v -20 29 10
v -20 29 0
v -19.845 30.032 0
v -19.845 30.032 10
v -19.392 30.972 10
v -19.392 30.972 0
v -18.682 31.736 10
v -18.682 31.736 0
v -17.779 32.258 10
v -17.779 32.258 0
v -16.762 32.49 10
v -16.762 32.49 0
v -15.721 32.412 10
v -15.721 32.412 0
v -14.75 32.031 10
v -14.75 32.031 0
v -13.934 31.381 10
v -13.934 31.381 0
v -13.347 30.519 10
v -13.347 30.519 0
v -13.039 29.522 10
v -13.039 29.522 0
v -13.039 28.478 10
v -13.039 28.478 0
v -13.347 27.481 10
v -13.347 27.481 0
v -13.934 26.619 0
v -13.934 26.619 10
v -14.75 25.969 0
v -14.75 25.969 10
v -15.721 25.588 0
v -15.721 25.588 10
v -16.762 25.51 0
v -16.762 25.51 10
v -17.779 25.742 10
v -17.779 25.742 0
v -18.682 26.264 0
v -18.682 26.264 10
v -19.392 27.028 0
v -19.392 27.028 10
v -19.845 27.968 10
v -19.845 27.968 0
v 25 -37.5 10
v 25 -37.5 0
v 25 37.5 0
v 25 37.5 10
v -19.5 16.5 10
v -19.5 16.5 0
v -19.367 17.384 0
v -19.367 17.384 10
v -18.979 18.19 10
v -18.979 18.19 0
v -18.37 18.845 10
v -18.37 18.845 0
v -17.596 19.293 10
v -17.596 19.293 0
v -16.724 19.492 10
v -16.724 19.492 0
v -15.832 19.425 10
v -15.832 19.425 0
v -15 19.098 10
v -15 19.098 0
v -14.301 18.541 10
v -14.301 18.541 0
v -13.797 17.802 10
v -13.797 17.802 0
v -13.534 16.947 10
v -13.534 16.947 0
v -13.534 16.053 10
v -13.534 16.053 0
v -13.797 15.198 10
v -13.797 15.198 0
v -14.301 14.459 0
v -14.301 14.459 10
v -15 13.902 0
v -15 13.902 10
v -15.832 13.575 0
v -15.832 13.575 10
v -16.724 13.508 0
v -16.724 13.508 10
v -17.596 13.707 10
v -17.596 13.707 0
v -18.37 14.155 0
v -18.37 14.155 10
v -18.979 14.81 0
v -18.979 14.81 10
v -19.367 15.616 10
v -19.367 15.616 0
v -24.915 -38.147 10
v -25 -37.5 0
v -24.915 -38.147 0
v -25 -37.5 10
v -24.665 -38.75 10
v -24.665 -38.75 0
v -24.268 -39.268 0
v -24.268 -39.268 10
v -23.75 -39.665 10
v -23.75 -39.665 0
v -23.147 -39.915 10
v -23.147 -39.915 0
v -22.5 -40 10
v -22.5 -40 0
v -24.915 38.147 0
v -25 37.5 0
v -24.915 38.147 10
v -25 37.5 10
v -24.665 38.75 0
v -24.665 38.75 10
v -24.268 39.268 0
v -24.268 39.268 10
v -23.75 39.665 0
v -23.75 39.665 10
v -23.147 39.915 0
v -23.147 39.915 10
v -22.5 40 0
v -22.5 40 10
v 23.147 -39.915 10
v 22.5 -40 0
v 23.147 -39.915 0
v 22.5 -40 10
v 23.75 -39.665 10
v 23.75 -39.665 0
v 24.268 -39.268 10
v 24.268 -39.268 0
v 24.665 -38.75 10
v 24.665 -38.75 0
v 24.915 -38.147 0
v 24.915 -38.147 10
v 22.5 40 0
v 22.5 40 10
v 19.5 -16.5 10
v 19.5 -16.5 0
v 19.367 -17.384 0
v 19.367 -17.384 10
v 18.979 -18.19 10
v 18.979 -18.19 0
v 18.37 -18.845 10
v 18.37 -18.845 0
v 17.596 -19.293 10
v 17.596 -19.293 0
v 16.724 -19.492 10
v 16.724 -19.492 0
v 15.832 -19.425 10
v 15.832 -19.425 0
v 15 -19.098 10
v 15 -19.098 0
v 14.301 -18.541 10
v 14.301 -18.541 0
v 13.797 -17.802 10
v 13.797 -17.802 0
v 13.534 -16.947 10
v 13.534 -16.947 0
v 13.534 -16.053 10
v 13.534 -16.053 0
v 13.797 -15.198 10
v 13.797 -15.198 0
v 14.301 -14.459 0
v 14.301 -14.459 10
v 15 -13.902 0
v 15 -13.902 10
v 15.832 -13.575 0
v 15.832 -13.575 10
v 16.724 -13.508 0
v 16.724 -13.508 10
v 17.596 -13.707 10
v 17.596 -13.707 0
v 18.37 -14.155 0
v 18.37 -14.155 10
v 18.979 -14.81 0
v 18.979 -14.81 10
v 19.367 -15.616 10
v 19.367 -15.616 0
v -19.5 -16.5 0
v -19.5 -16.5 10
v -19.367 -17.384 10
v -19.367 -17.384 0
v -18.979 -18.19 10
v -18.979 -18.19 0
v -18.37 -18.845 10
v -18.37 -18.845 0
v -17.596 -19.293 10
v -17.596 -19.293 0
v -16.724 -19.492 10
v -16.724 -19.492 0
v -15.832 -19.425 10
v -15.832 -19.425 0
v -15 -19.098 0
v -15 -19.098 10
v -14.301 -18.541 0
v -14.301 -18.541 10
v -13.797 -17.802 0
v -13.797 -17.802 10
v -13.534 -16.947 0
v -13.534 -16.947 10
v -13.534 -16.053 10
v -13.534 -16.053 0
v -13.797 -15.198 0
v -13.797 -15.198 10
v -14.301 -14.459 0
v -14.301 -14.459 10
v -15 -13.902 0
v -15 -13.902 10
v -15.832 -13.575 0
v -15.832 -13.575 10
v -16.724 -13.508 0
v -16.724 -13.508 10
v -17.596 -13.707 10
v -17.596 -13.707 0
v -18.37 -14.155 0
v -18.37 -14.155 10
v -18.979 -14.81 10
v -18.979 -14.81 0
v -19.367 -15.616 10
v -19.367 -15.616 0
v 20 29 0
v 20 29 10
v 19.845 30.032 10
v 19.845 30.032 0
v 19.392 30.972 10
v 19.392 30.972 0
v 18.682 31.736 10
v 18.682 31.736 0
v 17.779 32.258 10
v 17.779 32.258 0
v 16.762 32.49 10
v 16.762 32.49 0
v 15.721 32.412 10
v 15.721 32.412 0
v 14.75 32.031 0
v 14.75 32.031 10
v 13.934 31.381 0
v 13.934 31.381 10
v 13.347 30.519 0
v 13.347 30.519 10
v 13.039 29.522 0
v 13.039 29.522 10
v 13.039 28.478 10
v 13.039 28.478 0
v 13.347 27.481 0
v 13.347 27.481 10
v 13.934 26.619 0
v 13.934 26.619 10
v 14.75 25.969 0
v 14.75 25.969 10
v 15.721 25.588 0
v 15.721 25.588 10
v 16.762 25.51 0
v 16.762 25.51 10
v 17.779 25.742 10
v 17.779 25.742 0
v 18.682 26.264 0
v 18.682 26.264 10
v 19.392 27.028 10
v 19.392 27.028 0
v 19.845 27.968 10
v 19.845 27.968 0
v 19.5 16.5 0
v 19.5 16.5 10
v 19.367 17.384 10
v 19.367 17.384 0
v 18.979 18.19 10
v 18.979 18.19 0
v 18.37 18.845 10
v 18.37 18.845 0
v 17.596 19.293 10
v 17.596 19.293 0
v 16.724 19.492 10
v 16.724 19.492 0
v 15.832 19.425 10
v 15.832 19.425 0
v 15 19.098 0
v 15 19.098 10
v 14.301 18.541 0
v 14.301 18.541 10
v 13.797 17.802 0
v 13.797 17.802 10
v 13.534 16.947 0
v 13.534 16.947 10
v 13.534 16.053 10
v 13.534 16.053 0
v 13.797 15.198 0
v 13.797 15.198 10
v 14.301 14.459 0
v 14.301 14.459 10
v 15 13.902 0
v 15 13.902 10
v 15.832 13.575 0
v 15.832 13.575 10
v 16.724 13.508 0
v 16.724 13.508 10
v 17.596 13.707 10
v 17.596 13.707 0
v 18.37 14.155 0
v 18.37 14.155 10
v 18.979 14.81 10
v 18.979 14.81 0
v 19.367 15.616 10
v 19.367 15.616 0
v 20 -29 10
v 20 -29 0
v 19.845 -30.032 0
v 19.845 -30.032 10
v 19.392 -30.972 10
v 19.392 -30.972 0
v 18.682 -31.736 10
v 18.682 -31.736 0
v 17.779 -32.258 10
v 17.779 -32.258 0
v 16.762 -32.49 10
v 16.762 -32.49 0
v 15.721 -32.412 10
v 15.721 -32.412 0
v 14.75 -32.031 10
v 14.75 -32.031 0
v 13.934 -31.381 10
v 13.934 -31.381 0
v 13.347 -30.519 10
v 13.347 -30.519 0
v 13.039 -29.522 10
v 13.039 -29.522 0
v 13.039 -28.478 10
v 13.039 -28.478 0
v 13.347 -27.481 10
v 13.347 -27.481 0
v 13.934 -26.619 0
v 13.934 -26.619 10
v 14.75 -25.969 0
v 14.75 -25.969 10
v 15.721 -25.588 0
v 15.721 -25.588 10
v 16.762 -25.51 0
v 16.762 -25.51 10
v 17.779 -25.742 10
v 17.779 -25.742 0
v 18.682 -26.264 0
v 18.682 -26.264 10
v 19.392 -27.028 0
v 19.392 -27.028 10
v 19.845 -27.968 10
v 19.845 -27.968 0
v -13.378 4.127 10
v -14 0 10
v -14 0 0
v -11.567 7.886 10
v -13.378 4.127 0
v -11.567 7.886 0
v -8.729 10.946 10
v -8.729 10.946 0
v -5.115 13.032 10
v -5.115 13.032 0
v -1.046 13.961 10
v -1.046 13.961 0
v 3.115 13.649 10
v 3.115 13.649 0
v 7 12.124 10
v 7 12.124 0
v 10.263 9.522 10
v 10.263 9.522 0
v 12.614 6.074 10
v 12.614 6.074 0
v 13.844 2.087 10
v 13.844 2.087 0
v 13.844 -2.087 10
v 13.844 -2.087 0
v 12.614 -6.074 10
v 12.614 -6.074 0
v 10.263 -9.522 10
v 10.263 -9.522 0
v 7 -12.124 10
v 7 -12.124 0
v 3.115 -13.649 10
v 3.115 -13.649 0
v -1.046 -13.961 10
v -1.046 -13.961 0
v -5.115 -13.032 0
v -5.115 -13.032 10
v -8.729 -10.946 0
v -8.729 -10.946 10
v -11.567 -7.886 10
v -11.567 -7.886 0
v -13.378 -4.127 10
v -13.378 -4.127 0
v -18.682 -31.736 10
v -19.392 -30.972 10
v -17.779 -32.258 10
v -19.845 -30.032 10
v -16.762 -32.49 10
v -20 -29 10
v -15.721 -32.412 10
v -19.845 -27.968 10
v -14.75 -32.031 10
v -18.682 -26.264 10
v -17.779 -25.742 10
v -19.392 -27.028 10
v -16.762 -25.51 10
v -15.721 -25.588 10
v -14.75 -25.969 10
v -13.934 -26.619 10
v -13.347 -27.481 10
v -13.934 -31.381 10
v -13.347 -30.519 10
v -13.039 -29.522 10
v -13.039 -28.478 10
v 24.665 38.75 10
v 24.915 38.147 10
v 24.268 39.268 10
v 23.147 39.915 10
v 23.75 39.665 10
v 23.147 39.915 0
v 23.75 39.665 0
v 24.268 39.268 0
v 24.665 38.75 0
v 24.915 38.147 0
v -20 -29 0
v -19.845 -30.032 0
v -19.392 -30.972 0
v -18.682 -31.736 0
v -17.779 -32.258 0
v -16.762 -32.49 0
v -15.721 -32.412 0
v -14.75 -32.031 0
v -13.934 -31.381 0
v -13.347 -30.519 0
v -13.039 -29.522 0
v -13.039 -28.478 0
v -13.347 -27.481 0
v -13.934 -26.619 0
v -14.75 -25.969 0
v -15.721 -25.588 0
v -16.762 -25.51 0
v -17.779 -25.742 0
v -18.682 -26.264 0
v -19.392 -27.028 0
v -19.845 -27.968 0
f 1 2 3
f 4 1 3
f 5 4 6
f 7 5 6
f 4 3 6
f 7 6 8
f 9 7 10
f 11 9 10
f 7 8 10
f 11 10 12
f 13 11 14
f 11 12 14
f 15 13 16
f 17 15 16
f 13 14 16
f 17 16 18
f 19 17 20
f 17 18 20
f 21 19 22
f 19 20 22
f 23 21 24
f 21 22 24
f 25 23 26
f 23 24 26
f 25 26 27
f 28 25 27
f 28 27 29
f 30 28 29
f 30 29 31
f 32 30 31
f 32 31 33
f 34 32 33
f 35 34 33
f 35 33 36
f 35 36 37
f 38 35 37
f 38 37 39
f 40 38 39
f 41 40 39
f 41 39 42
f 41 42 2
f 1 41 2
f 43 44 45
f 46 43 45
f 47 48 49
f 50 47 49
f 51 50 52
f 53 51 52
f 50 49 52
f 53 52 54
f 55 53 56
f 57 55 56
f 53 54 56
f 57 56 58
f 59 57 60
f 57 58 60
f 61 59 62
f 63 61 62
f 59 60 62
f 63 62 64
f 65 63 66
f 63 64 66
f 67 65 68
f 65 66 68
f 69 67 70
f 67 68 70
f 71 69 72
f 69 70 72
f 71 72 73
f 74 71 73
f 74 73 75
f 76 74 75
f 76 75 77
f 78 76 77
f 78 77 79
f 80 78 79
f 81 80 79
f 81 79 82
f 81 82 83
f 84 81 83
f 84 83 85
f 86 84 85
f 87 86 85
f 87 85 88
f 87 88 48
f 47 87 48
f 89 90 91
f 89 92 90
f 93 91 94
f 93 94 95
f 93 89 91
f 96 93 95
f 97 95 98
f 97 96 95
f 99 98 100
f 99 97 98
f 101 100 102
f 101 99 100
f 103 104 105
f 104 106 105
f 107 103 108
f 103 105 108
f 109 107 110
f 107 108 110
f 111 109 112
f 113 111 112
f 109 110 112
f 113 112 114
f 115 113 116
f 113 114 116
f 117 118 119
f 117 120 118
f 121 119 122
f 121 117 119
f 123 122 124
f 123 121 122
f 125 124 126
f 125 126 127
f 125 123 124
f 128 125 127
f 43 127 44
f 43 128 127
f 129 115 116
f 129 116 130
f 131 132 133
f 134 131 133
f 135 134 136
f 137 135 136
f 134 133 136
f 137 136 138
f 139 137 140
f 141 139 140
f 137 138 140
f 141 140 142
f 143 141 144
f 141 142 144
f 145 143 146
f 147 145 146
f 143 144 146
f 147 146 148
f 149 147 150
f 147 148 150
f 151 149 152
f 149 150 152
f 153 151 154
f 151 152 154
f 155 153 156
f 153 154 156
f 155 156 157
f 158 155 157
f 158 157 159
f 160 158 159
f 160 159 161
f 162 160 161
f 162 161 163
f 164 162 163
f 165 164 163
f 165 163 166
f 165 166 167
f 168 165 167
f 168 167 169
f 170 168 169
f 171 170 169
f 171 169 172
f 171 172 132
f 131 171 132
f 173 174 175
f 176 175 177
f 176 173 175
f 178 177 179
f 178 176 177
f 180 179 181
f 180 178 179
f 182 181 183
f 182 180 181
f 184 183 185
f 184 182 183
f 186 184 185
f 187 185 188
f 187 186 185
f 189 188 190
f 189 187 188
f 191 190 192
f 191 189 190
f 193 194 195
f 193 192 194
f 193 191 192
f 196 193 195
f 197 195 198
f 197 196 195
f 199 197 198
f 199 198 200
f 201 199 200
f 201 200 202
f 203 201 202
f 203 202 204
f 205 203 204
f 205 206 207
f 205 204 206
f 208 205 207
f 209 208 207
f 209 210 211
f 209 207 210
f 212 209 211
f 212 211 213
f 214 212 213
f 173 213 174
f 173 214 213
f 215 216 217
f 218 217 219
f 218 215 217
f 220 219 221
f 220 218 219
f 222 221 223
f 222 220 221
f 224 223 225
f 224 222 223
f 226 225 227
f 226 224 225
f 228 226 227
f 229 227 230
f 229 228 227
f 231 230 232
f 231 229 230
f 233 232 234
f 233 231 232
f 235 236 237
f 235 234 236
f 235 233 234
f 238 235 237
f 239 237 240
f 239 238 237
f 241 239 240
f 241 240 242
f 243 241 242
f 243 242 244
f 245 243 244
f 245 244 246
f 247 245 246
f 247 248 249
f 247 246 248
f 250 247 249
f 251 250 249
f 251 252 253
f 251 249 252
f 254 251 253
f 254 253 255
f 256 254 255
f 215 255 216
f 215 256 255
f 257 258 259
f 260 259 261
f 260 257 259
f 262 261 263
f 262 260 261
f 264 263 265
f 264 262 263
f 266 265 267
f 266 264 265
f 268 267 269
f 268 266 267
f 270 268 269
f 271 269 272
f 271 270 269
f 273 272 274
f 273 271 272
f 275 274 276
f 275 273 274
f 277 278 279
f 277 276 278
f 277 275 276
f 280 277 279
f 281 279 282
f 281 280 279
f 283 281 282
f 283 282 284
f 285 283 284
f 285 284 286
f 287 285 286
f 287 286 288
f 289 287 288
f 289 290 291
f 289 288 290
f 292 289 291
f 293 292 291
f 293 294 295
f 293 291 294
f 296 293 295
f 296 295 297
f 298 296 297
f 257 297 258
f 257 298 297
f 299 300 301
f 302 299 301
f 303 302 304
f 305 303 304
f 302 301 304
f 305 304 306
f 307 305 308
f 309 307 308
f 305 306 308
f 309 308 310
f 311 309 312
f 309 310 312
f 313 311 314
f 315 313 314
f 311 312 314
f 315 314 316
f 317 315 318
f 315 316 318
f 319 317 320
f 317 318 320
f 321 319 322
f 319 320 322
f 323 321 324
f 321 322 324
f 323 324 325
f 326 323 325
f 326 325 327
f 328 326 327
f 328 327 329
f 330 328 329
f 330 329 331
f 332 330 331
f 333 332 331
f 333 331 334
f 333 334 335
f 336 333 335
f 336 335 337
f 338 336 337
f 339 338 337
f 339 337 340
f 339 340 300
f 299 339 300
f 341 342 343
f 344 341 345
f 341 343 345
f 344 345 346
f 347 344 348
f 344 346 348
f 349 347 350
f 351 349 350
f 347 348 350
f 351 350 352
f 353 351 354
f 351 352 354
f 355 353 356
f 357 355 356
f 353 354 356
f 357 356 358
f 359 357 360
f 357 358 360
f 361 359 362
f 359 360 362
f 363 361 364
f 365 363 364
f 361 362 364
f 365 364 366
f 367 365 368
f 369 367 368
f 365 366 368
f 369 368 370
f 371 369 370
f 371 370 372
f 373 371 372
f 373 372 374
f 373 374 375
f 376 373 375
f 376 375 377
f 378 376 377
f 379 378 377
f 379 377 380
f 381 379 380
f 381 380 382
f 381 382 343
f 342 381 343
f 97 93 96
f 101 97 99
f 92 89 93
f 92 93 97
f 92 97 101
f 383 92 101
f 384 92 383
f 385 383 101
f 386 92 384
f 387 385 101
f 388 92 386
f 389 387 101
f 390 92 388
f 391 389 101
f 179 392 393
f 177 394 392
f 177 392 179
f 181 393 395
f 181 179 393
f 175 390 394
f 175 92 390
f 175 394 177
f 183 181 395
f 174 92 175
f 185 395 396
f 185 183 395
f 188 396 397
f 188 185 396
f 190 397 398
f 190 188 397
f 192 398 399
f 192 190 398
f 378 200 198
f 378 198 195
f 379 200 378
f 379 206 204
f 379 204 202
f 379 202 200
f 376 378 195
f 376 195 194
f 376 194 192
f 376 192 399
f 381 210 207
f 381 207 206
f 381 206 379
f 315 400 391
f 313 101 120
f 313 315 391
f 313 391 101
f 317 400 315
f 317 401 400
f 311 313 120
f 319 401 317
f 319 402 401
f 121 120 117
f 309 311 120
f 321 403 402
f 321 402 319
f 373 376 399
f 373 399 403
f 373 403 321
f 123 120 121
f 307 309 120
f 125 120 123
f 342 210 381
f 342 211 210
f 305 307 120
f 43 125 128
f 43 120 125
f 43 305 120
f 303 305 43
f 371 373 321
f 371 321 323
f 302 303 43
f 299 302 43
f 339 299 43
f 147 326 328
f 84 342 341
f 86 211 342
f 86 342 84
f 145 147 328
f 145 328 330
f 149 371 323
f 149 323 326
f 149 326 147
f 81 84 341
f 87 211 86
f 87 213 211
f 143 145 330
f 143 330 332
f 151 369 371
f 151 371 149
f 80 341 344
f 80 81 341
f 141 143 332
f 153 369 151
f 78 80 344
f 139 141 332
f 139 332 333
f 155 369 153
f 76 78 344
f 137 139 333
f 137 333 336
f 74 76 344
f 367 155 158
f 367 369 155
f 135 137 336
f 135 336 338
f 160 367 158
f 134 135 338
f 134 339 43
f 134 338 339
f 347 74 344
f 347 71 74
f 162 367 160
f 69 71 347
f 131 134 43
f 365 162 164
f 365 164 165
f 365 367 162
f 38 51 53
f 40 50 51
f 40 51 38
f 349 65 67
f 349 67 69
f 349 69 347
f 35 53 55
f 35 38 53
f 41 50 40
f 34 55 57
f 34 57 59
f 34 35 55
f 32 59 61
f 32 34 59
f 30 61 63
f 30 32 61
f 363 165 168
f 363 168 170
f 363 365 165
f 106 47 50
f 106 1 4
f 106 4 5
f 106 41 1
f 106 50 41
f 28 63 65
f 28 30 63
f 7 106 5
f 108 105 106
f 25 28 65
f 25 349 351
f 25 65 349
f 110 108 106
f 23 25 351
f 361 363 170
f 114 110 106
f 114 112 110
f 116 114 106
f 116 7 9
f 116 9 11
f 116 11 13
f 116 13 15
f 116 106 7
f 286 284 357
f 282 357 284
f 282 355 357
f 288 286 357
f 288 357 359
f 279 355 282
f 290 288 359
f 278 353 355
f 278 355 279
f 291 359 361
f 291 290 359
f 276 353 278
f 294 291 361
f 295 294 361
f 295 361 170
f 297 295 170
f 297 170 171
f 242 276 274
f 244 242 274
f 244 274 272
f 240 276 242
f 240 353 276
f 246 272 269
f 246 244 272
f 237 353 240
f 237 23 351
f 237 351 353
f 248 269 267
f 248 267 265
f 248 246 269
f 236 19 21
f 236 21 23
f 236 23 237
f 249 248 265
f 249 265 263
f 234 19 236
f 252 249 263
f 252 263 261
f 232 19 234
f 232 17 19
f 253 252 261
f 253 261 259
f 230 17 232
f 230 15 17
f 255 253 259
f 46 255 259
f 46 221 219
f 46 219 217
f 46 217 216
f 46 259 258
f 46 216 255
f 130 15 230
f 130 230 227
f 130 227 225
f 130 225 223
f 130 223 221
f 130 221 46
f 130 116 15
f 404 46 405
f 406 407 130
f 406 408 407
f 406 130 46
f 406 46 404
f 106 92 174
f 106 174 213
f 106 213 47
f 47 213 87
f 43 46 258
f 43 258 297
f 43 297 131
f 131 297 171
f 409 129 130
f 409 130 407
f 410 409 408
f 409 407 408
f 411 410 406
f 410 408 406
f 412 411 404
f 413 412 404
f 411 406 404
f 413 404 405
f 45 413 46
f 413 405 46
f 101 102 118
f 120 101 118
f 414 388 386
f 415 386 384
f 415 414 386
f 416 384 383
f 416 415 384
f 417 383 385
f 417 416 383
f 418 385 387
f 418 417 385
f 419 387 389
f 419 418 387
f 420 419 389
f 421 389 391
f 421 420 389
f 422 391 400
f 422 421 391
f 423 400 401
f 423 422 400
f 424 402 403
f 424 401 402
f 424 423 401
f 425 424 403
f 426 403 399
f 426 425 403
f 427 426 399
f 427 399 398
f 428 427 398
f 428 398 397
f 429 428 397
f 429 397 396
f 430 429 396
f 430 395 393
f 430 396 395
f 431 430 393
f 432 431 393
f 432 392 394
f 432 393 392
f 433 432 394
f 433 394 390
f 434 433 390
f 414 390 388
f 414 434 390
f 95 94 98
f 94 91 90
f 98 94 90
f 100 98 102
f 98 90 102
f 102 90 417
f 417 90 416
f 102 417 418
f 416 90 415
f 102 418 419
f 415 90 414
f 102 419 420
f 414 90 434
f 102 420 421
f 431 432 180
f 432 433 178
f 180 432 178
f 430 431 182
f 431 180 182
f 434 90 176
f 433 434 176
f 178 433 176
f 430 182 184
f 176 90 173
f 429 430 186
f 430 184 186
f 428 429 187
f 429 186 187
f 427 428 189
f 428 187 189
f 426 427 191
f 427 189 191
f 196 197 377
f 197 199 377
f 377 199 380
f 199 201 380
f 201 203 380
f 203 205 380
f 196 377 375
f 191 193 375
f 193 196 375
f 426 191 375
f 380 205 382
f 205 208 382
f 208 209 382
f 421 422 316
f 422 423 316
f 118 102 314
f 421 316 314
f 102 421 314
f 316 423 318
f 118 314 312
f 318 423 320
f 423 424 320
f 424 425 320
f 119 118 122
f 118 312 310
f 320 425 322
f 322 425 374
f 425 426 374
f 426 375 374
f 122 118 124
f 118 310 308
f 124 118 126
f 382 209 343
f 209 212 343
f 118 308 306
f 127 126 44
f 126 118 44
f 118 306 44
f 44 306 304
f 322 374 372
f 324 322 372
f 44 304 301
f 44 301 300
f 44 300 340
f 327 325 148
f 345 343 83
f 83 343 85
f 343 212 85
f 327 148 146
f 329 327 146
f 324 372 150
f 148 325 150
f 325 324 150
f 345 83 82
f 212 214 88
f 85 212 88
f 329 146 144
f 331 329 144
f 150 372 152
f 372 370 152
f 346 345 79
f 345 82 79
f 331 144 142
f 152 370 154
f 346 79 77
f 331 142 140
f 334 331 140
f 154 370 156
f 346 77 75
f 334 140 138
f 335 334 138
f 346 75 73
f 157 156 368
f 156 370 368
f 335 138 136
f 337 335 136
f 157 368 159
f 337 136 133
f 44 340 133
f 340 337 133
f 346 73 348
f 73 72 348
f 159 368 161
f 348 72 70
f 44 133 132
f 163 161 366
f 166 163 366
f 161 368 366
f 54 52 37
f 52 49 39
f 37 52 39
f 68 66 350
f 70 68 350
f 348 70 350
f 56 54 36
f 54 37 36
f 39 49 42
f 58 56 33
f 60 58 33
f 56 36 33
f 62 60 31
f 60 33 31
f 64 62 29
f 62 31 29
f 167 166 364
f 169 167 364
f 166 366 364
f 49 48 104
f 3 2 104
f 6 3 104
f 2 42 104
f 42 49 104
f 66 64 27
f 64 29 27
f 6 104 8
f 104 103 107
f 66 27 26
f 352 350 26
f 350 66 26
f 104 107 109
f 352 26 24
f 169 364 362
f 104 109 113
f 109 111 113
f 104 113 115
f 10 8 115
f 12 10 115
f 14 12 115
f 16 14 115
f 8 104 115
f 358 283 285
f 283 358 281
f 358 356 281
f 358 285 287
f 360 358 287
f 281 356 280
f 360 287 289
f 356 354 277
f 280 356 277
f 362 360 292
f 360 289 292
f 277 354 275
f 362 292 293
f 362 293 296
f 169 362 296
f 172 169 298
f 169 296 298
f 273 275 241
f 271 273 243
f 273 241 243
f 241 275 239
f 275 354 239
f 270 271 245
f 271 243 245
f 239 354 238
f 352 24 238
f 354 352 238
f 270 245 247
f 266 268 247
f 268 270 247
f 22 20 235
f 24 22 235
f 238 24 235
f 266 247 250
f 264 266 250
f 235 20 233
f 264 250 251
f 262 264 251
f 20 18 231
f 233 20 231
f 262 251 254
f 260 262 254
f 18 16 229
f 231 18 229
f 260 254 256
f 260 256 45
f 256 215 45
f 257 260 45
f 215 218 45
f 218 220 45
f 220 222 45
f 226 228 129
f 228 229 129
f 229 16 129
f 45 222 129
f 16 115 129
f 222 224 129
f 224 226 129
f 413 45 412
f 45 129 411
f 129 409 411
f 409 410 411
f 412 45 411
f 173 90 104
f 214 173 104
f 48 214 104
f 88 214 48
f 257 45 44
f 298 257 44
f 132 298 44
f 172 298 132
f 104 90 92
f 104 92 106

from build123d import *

# Parameters (mm, degrees)
SKETCH_2_W                 = 50
SKETCH_2_H                 = 80
EXTRUDE_1_DEPTH            = 10
SKETCH_3_R                 = 3.5
SKETCH_3_R_2               = 3
CUT_EXTRUDE_1_DEPTH        = 49.218253805
MIRROR_2_COPY_1_SKETCH_R   = 3.5
MIRROR_2_COPY_1_SKETCH_R_2 = 3
MIRROR_2_COPY_1_DEPTH      = 49.218253805
SKETCH_4_R                 = 14
CUT_EXTRUDE_2_DEPTH        = 49.218253805
FILLET_1_R                 = 2.5


with BuildPart() as part:
    # 草图2 → 凸台-拉伸1 (new body)
    with BuildSketch(Plane.XY):
        Rectangle(SKETCH_2_W, SKETCH_2_H)
    extrude(amount=EXTRUDE_1_DEPTH)

    # 草图3 → 切除-拉伸1 (cut, through all)
    with BuildSketch(Plane(origin=(0, 0, 0), x_dir=(-1, 0, 0), z_dir=(0, 0, -1))):
        with Locations((16.5, 29)):
            Circle(SKETCH_3_R)
        with Locations((16.5, 16.5)):
            Circle(SKETCH_3_R_2)
    cut_extrude_1 = extrude(amount=-CUT_EXTRUDE_1_DEPTH, mode=Mode.SUBTRACT)

    # 镜向1: 切除-拉伸1 across plane
    add(cut_extrude_1.mirror(Plane(origin=(0, 0, 0), x_dir=(0, 0, 1), z_dir=(1, 0, 0))), mode=Mode.SUBTRACT)

    # 镜向2: 切除-拉伸1 across plane
    add(cut_extrude_1.mirror(Plane.ZX), mode=Mode.SUBTRACT)

    # 镜向2 copy 1 sketch → 镜向2 copy 1 (cut, through all)
    with BuildSketch(Plane(origin=(0, 0, 0), x_dir=(1, 0, 0), z_dir=(0, 0, -1))):
        with Locations((16.5, 29)):
            Circle(MIRROR_2_COPY_1_SKETCH_R)
        with Locations((16.5, 16.5)):
            Circle(MIRROR_2_COPY_1_SKETCH_R_2)
    extrude(amount=-MIRROR_2_COPY_1_DEPTH, mode=Mode.SUBTRACT)

    # 草图4 → 切除-拉伸2 (cut, through all)
    with BuildSketch(Plane(origin=(0, 0, 0), x_dir=(-1, 0, 0), z_dir=(0, 0, -1))):
        Circle(SKETCH_4_R)
    extrude(amount=-CUT_EXTRUDE_2_DEPTH, mode=Mode.SUBTRACT)

    # 圆角1
    fillet_1_edges = [part.edges().sort_by_distance(p)[0] for p in [
        (-25, 40, 5),
        (25, 40, 5),
        (25, -40, 5),
        (-25, -40, 5),
    ]]
    fillet(fillet_1_edges, radius=FILLET_1_R)


solid = part.part
